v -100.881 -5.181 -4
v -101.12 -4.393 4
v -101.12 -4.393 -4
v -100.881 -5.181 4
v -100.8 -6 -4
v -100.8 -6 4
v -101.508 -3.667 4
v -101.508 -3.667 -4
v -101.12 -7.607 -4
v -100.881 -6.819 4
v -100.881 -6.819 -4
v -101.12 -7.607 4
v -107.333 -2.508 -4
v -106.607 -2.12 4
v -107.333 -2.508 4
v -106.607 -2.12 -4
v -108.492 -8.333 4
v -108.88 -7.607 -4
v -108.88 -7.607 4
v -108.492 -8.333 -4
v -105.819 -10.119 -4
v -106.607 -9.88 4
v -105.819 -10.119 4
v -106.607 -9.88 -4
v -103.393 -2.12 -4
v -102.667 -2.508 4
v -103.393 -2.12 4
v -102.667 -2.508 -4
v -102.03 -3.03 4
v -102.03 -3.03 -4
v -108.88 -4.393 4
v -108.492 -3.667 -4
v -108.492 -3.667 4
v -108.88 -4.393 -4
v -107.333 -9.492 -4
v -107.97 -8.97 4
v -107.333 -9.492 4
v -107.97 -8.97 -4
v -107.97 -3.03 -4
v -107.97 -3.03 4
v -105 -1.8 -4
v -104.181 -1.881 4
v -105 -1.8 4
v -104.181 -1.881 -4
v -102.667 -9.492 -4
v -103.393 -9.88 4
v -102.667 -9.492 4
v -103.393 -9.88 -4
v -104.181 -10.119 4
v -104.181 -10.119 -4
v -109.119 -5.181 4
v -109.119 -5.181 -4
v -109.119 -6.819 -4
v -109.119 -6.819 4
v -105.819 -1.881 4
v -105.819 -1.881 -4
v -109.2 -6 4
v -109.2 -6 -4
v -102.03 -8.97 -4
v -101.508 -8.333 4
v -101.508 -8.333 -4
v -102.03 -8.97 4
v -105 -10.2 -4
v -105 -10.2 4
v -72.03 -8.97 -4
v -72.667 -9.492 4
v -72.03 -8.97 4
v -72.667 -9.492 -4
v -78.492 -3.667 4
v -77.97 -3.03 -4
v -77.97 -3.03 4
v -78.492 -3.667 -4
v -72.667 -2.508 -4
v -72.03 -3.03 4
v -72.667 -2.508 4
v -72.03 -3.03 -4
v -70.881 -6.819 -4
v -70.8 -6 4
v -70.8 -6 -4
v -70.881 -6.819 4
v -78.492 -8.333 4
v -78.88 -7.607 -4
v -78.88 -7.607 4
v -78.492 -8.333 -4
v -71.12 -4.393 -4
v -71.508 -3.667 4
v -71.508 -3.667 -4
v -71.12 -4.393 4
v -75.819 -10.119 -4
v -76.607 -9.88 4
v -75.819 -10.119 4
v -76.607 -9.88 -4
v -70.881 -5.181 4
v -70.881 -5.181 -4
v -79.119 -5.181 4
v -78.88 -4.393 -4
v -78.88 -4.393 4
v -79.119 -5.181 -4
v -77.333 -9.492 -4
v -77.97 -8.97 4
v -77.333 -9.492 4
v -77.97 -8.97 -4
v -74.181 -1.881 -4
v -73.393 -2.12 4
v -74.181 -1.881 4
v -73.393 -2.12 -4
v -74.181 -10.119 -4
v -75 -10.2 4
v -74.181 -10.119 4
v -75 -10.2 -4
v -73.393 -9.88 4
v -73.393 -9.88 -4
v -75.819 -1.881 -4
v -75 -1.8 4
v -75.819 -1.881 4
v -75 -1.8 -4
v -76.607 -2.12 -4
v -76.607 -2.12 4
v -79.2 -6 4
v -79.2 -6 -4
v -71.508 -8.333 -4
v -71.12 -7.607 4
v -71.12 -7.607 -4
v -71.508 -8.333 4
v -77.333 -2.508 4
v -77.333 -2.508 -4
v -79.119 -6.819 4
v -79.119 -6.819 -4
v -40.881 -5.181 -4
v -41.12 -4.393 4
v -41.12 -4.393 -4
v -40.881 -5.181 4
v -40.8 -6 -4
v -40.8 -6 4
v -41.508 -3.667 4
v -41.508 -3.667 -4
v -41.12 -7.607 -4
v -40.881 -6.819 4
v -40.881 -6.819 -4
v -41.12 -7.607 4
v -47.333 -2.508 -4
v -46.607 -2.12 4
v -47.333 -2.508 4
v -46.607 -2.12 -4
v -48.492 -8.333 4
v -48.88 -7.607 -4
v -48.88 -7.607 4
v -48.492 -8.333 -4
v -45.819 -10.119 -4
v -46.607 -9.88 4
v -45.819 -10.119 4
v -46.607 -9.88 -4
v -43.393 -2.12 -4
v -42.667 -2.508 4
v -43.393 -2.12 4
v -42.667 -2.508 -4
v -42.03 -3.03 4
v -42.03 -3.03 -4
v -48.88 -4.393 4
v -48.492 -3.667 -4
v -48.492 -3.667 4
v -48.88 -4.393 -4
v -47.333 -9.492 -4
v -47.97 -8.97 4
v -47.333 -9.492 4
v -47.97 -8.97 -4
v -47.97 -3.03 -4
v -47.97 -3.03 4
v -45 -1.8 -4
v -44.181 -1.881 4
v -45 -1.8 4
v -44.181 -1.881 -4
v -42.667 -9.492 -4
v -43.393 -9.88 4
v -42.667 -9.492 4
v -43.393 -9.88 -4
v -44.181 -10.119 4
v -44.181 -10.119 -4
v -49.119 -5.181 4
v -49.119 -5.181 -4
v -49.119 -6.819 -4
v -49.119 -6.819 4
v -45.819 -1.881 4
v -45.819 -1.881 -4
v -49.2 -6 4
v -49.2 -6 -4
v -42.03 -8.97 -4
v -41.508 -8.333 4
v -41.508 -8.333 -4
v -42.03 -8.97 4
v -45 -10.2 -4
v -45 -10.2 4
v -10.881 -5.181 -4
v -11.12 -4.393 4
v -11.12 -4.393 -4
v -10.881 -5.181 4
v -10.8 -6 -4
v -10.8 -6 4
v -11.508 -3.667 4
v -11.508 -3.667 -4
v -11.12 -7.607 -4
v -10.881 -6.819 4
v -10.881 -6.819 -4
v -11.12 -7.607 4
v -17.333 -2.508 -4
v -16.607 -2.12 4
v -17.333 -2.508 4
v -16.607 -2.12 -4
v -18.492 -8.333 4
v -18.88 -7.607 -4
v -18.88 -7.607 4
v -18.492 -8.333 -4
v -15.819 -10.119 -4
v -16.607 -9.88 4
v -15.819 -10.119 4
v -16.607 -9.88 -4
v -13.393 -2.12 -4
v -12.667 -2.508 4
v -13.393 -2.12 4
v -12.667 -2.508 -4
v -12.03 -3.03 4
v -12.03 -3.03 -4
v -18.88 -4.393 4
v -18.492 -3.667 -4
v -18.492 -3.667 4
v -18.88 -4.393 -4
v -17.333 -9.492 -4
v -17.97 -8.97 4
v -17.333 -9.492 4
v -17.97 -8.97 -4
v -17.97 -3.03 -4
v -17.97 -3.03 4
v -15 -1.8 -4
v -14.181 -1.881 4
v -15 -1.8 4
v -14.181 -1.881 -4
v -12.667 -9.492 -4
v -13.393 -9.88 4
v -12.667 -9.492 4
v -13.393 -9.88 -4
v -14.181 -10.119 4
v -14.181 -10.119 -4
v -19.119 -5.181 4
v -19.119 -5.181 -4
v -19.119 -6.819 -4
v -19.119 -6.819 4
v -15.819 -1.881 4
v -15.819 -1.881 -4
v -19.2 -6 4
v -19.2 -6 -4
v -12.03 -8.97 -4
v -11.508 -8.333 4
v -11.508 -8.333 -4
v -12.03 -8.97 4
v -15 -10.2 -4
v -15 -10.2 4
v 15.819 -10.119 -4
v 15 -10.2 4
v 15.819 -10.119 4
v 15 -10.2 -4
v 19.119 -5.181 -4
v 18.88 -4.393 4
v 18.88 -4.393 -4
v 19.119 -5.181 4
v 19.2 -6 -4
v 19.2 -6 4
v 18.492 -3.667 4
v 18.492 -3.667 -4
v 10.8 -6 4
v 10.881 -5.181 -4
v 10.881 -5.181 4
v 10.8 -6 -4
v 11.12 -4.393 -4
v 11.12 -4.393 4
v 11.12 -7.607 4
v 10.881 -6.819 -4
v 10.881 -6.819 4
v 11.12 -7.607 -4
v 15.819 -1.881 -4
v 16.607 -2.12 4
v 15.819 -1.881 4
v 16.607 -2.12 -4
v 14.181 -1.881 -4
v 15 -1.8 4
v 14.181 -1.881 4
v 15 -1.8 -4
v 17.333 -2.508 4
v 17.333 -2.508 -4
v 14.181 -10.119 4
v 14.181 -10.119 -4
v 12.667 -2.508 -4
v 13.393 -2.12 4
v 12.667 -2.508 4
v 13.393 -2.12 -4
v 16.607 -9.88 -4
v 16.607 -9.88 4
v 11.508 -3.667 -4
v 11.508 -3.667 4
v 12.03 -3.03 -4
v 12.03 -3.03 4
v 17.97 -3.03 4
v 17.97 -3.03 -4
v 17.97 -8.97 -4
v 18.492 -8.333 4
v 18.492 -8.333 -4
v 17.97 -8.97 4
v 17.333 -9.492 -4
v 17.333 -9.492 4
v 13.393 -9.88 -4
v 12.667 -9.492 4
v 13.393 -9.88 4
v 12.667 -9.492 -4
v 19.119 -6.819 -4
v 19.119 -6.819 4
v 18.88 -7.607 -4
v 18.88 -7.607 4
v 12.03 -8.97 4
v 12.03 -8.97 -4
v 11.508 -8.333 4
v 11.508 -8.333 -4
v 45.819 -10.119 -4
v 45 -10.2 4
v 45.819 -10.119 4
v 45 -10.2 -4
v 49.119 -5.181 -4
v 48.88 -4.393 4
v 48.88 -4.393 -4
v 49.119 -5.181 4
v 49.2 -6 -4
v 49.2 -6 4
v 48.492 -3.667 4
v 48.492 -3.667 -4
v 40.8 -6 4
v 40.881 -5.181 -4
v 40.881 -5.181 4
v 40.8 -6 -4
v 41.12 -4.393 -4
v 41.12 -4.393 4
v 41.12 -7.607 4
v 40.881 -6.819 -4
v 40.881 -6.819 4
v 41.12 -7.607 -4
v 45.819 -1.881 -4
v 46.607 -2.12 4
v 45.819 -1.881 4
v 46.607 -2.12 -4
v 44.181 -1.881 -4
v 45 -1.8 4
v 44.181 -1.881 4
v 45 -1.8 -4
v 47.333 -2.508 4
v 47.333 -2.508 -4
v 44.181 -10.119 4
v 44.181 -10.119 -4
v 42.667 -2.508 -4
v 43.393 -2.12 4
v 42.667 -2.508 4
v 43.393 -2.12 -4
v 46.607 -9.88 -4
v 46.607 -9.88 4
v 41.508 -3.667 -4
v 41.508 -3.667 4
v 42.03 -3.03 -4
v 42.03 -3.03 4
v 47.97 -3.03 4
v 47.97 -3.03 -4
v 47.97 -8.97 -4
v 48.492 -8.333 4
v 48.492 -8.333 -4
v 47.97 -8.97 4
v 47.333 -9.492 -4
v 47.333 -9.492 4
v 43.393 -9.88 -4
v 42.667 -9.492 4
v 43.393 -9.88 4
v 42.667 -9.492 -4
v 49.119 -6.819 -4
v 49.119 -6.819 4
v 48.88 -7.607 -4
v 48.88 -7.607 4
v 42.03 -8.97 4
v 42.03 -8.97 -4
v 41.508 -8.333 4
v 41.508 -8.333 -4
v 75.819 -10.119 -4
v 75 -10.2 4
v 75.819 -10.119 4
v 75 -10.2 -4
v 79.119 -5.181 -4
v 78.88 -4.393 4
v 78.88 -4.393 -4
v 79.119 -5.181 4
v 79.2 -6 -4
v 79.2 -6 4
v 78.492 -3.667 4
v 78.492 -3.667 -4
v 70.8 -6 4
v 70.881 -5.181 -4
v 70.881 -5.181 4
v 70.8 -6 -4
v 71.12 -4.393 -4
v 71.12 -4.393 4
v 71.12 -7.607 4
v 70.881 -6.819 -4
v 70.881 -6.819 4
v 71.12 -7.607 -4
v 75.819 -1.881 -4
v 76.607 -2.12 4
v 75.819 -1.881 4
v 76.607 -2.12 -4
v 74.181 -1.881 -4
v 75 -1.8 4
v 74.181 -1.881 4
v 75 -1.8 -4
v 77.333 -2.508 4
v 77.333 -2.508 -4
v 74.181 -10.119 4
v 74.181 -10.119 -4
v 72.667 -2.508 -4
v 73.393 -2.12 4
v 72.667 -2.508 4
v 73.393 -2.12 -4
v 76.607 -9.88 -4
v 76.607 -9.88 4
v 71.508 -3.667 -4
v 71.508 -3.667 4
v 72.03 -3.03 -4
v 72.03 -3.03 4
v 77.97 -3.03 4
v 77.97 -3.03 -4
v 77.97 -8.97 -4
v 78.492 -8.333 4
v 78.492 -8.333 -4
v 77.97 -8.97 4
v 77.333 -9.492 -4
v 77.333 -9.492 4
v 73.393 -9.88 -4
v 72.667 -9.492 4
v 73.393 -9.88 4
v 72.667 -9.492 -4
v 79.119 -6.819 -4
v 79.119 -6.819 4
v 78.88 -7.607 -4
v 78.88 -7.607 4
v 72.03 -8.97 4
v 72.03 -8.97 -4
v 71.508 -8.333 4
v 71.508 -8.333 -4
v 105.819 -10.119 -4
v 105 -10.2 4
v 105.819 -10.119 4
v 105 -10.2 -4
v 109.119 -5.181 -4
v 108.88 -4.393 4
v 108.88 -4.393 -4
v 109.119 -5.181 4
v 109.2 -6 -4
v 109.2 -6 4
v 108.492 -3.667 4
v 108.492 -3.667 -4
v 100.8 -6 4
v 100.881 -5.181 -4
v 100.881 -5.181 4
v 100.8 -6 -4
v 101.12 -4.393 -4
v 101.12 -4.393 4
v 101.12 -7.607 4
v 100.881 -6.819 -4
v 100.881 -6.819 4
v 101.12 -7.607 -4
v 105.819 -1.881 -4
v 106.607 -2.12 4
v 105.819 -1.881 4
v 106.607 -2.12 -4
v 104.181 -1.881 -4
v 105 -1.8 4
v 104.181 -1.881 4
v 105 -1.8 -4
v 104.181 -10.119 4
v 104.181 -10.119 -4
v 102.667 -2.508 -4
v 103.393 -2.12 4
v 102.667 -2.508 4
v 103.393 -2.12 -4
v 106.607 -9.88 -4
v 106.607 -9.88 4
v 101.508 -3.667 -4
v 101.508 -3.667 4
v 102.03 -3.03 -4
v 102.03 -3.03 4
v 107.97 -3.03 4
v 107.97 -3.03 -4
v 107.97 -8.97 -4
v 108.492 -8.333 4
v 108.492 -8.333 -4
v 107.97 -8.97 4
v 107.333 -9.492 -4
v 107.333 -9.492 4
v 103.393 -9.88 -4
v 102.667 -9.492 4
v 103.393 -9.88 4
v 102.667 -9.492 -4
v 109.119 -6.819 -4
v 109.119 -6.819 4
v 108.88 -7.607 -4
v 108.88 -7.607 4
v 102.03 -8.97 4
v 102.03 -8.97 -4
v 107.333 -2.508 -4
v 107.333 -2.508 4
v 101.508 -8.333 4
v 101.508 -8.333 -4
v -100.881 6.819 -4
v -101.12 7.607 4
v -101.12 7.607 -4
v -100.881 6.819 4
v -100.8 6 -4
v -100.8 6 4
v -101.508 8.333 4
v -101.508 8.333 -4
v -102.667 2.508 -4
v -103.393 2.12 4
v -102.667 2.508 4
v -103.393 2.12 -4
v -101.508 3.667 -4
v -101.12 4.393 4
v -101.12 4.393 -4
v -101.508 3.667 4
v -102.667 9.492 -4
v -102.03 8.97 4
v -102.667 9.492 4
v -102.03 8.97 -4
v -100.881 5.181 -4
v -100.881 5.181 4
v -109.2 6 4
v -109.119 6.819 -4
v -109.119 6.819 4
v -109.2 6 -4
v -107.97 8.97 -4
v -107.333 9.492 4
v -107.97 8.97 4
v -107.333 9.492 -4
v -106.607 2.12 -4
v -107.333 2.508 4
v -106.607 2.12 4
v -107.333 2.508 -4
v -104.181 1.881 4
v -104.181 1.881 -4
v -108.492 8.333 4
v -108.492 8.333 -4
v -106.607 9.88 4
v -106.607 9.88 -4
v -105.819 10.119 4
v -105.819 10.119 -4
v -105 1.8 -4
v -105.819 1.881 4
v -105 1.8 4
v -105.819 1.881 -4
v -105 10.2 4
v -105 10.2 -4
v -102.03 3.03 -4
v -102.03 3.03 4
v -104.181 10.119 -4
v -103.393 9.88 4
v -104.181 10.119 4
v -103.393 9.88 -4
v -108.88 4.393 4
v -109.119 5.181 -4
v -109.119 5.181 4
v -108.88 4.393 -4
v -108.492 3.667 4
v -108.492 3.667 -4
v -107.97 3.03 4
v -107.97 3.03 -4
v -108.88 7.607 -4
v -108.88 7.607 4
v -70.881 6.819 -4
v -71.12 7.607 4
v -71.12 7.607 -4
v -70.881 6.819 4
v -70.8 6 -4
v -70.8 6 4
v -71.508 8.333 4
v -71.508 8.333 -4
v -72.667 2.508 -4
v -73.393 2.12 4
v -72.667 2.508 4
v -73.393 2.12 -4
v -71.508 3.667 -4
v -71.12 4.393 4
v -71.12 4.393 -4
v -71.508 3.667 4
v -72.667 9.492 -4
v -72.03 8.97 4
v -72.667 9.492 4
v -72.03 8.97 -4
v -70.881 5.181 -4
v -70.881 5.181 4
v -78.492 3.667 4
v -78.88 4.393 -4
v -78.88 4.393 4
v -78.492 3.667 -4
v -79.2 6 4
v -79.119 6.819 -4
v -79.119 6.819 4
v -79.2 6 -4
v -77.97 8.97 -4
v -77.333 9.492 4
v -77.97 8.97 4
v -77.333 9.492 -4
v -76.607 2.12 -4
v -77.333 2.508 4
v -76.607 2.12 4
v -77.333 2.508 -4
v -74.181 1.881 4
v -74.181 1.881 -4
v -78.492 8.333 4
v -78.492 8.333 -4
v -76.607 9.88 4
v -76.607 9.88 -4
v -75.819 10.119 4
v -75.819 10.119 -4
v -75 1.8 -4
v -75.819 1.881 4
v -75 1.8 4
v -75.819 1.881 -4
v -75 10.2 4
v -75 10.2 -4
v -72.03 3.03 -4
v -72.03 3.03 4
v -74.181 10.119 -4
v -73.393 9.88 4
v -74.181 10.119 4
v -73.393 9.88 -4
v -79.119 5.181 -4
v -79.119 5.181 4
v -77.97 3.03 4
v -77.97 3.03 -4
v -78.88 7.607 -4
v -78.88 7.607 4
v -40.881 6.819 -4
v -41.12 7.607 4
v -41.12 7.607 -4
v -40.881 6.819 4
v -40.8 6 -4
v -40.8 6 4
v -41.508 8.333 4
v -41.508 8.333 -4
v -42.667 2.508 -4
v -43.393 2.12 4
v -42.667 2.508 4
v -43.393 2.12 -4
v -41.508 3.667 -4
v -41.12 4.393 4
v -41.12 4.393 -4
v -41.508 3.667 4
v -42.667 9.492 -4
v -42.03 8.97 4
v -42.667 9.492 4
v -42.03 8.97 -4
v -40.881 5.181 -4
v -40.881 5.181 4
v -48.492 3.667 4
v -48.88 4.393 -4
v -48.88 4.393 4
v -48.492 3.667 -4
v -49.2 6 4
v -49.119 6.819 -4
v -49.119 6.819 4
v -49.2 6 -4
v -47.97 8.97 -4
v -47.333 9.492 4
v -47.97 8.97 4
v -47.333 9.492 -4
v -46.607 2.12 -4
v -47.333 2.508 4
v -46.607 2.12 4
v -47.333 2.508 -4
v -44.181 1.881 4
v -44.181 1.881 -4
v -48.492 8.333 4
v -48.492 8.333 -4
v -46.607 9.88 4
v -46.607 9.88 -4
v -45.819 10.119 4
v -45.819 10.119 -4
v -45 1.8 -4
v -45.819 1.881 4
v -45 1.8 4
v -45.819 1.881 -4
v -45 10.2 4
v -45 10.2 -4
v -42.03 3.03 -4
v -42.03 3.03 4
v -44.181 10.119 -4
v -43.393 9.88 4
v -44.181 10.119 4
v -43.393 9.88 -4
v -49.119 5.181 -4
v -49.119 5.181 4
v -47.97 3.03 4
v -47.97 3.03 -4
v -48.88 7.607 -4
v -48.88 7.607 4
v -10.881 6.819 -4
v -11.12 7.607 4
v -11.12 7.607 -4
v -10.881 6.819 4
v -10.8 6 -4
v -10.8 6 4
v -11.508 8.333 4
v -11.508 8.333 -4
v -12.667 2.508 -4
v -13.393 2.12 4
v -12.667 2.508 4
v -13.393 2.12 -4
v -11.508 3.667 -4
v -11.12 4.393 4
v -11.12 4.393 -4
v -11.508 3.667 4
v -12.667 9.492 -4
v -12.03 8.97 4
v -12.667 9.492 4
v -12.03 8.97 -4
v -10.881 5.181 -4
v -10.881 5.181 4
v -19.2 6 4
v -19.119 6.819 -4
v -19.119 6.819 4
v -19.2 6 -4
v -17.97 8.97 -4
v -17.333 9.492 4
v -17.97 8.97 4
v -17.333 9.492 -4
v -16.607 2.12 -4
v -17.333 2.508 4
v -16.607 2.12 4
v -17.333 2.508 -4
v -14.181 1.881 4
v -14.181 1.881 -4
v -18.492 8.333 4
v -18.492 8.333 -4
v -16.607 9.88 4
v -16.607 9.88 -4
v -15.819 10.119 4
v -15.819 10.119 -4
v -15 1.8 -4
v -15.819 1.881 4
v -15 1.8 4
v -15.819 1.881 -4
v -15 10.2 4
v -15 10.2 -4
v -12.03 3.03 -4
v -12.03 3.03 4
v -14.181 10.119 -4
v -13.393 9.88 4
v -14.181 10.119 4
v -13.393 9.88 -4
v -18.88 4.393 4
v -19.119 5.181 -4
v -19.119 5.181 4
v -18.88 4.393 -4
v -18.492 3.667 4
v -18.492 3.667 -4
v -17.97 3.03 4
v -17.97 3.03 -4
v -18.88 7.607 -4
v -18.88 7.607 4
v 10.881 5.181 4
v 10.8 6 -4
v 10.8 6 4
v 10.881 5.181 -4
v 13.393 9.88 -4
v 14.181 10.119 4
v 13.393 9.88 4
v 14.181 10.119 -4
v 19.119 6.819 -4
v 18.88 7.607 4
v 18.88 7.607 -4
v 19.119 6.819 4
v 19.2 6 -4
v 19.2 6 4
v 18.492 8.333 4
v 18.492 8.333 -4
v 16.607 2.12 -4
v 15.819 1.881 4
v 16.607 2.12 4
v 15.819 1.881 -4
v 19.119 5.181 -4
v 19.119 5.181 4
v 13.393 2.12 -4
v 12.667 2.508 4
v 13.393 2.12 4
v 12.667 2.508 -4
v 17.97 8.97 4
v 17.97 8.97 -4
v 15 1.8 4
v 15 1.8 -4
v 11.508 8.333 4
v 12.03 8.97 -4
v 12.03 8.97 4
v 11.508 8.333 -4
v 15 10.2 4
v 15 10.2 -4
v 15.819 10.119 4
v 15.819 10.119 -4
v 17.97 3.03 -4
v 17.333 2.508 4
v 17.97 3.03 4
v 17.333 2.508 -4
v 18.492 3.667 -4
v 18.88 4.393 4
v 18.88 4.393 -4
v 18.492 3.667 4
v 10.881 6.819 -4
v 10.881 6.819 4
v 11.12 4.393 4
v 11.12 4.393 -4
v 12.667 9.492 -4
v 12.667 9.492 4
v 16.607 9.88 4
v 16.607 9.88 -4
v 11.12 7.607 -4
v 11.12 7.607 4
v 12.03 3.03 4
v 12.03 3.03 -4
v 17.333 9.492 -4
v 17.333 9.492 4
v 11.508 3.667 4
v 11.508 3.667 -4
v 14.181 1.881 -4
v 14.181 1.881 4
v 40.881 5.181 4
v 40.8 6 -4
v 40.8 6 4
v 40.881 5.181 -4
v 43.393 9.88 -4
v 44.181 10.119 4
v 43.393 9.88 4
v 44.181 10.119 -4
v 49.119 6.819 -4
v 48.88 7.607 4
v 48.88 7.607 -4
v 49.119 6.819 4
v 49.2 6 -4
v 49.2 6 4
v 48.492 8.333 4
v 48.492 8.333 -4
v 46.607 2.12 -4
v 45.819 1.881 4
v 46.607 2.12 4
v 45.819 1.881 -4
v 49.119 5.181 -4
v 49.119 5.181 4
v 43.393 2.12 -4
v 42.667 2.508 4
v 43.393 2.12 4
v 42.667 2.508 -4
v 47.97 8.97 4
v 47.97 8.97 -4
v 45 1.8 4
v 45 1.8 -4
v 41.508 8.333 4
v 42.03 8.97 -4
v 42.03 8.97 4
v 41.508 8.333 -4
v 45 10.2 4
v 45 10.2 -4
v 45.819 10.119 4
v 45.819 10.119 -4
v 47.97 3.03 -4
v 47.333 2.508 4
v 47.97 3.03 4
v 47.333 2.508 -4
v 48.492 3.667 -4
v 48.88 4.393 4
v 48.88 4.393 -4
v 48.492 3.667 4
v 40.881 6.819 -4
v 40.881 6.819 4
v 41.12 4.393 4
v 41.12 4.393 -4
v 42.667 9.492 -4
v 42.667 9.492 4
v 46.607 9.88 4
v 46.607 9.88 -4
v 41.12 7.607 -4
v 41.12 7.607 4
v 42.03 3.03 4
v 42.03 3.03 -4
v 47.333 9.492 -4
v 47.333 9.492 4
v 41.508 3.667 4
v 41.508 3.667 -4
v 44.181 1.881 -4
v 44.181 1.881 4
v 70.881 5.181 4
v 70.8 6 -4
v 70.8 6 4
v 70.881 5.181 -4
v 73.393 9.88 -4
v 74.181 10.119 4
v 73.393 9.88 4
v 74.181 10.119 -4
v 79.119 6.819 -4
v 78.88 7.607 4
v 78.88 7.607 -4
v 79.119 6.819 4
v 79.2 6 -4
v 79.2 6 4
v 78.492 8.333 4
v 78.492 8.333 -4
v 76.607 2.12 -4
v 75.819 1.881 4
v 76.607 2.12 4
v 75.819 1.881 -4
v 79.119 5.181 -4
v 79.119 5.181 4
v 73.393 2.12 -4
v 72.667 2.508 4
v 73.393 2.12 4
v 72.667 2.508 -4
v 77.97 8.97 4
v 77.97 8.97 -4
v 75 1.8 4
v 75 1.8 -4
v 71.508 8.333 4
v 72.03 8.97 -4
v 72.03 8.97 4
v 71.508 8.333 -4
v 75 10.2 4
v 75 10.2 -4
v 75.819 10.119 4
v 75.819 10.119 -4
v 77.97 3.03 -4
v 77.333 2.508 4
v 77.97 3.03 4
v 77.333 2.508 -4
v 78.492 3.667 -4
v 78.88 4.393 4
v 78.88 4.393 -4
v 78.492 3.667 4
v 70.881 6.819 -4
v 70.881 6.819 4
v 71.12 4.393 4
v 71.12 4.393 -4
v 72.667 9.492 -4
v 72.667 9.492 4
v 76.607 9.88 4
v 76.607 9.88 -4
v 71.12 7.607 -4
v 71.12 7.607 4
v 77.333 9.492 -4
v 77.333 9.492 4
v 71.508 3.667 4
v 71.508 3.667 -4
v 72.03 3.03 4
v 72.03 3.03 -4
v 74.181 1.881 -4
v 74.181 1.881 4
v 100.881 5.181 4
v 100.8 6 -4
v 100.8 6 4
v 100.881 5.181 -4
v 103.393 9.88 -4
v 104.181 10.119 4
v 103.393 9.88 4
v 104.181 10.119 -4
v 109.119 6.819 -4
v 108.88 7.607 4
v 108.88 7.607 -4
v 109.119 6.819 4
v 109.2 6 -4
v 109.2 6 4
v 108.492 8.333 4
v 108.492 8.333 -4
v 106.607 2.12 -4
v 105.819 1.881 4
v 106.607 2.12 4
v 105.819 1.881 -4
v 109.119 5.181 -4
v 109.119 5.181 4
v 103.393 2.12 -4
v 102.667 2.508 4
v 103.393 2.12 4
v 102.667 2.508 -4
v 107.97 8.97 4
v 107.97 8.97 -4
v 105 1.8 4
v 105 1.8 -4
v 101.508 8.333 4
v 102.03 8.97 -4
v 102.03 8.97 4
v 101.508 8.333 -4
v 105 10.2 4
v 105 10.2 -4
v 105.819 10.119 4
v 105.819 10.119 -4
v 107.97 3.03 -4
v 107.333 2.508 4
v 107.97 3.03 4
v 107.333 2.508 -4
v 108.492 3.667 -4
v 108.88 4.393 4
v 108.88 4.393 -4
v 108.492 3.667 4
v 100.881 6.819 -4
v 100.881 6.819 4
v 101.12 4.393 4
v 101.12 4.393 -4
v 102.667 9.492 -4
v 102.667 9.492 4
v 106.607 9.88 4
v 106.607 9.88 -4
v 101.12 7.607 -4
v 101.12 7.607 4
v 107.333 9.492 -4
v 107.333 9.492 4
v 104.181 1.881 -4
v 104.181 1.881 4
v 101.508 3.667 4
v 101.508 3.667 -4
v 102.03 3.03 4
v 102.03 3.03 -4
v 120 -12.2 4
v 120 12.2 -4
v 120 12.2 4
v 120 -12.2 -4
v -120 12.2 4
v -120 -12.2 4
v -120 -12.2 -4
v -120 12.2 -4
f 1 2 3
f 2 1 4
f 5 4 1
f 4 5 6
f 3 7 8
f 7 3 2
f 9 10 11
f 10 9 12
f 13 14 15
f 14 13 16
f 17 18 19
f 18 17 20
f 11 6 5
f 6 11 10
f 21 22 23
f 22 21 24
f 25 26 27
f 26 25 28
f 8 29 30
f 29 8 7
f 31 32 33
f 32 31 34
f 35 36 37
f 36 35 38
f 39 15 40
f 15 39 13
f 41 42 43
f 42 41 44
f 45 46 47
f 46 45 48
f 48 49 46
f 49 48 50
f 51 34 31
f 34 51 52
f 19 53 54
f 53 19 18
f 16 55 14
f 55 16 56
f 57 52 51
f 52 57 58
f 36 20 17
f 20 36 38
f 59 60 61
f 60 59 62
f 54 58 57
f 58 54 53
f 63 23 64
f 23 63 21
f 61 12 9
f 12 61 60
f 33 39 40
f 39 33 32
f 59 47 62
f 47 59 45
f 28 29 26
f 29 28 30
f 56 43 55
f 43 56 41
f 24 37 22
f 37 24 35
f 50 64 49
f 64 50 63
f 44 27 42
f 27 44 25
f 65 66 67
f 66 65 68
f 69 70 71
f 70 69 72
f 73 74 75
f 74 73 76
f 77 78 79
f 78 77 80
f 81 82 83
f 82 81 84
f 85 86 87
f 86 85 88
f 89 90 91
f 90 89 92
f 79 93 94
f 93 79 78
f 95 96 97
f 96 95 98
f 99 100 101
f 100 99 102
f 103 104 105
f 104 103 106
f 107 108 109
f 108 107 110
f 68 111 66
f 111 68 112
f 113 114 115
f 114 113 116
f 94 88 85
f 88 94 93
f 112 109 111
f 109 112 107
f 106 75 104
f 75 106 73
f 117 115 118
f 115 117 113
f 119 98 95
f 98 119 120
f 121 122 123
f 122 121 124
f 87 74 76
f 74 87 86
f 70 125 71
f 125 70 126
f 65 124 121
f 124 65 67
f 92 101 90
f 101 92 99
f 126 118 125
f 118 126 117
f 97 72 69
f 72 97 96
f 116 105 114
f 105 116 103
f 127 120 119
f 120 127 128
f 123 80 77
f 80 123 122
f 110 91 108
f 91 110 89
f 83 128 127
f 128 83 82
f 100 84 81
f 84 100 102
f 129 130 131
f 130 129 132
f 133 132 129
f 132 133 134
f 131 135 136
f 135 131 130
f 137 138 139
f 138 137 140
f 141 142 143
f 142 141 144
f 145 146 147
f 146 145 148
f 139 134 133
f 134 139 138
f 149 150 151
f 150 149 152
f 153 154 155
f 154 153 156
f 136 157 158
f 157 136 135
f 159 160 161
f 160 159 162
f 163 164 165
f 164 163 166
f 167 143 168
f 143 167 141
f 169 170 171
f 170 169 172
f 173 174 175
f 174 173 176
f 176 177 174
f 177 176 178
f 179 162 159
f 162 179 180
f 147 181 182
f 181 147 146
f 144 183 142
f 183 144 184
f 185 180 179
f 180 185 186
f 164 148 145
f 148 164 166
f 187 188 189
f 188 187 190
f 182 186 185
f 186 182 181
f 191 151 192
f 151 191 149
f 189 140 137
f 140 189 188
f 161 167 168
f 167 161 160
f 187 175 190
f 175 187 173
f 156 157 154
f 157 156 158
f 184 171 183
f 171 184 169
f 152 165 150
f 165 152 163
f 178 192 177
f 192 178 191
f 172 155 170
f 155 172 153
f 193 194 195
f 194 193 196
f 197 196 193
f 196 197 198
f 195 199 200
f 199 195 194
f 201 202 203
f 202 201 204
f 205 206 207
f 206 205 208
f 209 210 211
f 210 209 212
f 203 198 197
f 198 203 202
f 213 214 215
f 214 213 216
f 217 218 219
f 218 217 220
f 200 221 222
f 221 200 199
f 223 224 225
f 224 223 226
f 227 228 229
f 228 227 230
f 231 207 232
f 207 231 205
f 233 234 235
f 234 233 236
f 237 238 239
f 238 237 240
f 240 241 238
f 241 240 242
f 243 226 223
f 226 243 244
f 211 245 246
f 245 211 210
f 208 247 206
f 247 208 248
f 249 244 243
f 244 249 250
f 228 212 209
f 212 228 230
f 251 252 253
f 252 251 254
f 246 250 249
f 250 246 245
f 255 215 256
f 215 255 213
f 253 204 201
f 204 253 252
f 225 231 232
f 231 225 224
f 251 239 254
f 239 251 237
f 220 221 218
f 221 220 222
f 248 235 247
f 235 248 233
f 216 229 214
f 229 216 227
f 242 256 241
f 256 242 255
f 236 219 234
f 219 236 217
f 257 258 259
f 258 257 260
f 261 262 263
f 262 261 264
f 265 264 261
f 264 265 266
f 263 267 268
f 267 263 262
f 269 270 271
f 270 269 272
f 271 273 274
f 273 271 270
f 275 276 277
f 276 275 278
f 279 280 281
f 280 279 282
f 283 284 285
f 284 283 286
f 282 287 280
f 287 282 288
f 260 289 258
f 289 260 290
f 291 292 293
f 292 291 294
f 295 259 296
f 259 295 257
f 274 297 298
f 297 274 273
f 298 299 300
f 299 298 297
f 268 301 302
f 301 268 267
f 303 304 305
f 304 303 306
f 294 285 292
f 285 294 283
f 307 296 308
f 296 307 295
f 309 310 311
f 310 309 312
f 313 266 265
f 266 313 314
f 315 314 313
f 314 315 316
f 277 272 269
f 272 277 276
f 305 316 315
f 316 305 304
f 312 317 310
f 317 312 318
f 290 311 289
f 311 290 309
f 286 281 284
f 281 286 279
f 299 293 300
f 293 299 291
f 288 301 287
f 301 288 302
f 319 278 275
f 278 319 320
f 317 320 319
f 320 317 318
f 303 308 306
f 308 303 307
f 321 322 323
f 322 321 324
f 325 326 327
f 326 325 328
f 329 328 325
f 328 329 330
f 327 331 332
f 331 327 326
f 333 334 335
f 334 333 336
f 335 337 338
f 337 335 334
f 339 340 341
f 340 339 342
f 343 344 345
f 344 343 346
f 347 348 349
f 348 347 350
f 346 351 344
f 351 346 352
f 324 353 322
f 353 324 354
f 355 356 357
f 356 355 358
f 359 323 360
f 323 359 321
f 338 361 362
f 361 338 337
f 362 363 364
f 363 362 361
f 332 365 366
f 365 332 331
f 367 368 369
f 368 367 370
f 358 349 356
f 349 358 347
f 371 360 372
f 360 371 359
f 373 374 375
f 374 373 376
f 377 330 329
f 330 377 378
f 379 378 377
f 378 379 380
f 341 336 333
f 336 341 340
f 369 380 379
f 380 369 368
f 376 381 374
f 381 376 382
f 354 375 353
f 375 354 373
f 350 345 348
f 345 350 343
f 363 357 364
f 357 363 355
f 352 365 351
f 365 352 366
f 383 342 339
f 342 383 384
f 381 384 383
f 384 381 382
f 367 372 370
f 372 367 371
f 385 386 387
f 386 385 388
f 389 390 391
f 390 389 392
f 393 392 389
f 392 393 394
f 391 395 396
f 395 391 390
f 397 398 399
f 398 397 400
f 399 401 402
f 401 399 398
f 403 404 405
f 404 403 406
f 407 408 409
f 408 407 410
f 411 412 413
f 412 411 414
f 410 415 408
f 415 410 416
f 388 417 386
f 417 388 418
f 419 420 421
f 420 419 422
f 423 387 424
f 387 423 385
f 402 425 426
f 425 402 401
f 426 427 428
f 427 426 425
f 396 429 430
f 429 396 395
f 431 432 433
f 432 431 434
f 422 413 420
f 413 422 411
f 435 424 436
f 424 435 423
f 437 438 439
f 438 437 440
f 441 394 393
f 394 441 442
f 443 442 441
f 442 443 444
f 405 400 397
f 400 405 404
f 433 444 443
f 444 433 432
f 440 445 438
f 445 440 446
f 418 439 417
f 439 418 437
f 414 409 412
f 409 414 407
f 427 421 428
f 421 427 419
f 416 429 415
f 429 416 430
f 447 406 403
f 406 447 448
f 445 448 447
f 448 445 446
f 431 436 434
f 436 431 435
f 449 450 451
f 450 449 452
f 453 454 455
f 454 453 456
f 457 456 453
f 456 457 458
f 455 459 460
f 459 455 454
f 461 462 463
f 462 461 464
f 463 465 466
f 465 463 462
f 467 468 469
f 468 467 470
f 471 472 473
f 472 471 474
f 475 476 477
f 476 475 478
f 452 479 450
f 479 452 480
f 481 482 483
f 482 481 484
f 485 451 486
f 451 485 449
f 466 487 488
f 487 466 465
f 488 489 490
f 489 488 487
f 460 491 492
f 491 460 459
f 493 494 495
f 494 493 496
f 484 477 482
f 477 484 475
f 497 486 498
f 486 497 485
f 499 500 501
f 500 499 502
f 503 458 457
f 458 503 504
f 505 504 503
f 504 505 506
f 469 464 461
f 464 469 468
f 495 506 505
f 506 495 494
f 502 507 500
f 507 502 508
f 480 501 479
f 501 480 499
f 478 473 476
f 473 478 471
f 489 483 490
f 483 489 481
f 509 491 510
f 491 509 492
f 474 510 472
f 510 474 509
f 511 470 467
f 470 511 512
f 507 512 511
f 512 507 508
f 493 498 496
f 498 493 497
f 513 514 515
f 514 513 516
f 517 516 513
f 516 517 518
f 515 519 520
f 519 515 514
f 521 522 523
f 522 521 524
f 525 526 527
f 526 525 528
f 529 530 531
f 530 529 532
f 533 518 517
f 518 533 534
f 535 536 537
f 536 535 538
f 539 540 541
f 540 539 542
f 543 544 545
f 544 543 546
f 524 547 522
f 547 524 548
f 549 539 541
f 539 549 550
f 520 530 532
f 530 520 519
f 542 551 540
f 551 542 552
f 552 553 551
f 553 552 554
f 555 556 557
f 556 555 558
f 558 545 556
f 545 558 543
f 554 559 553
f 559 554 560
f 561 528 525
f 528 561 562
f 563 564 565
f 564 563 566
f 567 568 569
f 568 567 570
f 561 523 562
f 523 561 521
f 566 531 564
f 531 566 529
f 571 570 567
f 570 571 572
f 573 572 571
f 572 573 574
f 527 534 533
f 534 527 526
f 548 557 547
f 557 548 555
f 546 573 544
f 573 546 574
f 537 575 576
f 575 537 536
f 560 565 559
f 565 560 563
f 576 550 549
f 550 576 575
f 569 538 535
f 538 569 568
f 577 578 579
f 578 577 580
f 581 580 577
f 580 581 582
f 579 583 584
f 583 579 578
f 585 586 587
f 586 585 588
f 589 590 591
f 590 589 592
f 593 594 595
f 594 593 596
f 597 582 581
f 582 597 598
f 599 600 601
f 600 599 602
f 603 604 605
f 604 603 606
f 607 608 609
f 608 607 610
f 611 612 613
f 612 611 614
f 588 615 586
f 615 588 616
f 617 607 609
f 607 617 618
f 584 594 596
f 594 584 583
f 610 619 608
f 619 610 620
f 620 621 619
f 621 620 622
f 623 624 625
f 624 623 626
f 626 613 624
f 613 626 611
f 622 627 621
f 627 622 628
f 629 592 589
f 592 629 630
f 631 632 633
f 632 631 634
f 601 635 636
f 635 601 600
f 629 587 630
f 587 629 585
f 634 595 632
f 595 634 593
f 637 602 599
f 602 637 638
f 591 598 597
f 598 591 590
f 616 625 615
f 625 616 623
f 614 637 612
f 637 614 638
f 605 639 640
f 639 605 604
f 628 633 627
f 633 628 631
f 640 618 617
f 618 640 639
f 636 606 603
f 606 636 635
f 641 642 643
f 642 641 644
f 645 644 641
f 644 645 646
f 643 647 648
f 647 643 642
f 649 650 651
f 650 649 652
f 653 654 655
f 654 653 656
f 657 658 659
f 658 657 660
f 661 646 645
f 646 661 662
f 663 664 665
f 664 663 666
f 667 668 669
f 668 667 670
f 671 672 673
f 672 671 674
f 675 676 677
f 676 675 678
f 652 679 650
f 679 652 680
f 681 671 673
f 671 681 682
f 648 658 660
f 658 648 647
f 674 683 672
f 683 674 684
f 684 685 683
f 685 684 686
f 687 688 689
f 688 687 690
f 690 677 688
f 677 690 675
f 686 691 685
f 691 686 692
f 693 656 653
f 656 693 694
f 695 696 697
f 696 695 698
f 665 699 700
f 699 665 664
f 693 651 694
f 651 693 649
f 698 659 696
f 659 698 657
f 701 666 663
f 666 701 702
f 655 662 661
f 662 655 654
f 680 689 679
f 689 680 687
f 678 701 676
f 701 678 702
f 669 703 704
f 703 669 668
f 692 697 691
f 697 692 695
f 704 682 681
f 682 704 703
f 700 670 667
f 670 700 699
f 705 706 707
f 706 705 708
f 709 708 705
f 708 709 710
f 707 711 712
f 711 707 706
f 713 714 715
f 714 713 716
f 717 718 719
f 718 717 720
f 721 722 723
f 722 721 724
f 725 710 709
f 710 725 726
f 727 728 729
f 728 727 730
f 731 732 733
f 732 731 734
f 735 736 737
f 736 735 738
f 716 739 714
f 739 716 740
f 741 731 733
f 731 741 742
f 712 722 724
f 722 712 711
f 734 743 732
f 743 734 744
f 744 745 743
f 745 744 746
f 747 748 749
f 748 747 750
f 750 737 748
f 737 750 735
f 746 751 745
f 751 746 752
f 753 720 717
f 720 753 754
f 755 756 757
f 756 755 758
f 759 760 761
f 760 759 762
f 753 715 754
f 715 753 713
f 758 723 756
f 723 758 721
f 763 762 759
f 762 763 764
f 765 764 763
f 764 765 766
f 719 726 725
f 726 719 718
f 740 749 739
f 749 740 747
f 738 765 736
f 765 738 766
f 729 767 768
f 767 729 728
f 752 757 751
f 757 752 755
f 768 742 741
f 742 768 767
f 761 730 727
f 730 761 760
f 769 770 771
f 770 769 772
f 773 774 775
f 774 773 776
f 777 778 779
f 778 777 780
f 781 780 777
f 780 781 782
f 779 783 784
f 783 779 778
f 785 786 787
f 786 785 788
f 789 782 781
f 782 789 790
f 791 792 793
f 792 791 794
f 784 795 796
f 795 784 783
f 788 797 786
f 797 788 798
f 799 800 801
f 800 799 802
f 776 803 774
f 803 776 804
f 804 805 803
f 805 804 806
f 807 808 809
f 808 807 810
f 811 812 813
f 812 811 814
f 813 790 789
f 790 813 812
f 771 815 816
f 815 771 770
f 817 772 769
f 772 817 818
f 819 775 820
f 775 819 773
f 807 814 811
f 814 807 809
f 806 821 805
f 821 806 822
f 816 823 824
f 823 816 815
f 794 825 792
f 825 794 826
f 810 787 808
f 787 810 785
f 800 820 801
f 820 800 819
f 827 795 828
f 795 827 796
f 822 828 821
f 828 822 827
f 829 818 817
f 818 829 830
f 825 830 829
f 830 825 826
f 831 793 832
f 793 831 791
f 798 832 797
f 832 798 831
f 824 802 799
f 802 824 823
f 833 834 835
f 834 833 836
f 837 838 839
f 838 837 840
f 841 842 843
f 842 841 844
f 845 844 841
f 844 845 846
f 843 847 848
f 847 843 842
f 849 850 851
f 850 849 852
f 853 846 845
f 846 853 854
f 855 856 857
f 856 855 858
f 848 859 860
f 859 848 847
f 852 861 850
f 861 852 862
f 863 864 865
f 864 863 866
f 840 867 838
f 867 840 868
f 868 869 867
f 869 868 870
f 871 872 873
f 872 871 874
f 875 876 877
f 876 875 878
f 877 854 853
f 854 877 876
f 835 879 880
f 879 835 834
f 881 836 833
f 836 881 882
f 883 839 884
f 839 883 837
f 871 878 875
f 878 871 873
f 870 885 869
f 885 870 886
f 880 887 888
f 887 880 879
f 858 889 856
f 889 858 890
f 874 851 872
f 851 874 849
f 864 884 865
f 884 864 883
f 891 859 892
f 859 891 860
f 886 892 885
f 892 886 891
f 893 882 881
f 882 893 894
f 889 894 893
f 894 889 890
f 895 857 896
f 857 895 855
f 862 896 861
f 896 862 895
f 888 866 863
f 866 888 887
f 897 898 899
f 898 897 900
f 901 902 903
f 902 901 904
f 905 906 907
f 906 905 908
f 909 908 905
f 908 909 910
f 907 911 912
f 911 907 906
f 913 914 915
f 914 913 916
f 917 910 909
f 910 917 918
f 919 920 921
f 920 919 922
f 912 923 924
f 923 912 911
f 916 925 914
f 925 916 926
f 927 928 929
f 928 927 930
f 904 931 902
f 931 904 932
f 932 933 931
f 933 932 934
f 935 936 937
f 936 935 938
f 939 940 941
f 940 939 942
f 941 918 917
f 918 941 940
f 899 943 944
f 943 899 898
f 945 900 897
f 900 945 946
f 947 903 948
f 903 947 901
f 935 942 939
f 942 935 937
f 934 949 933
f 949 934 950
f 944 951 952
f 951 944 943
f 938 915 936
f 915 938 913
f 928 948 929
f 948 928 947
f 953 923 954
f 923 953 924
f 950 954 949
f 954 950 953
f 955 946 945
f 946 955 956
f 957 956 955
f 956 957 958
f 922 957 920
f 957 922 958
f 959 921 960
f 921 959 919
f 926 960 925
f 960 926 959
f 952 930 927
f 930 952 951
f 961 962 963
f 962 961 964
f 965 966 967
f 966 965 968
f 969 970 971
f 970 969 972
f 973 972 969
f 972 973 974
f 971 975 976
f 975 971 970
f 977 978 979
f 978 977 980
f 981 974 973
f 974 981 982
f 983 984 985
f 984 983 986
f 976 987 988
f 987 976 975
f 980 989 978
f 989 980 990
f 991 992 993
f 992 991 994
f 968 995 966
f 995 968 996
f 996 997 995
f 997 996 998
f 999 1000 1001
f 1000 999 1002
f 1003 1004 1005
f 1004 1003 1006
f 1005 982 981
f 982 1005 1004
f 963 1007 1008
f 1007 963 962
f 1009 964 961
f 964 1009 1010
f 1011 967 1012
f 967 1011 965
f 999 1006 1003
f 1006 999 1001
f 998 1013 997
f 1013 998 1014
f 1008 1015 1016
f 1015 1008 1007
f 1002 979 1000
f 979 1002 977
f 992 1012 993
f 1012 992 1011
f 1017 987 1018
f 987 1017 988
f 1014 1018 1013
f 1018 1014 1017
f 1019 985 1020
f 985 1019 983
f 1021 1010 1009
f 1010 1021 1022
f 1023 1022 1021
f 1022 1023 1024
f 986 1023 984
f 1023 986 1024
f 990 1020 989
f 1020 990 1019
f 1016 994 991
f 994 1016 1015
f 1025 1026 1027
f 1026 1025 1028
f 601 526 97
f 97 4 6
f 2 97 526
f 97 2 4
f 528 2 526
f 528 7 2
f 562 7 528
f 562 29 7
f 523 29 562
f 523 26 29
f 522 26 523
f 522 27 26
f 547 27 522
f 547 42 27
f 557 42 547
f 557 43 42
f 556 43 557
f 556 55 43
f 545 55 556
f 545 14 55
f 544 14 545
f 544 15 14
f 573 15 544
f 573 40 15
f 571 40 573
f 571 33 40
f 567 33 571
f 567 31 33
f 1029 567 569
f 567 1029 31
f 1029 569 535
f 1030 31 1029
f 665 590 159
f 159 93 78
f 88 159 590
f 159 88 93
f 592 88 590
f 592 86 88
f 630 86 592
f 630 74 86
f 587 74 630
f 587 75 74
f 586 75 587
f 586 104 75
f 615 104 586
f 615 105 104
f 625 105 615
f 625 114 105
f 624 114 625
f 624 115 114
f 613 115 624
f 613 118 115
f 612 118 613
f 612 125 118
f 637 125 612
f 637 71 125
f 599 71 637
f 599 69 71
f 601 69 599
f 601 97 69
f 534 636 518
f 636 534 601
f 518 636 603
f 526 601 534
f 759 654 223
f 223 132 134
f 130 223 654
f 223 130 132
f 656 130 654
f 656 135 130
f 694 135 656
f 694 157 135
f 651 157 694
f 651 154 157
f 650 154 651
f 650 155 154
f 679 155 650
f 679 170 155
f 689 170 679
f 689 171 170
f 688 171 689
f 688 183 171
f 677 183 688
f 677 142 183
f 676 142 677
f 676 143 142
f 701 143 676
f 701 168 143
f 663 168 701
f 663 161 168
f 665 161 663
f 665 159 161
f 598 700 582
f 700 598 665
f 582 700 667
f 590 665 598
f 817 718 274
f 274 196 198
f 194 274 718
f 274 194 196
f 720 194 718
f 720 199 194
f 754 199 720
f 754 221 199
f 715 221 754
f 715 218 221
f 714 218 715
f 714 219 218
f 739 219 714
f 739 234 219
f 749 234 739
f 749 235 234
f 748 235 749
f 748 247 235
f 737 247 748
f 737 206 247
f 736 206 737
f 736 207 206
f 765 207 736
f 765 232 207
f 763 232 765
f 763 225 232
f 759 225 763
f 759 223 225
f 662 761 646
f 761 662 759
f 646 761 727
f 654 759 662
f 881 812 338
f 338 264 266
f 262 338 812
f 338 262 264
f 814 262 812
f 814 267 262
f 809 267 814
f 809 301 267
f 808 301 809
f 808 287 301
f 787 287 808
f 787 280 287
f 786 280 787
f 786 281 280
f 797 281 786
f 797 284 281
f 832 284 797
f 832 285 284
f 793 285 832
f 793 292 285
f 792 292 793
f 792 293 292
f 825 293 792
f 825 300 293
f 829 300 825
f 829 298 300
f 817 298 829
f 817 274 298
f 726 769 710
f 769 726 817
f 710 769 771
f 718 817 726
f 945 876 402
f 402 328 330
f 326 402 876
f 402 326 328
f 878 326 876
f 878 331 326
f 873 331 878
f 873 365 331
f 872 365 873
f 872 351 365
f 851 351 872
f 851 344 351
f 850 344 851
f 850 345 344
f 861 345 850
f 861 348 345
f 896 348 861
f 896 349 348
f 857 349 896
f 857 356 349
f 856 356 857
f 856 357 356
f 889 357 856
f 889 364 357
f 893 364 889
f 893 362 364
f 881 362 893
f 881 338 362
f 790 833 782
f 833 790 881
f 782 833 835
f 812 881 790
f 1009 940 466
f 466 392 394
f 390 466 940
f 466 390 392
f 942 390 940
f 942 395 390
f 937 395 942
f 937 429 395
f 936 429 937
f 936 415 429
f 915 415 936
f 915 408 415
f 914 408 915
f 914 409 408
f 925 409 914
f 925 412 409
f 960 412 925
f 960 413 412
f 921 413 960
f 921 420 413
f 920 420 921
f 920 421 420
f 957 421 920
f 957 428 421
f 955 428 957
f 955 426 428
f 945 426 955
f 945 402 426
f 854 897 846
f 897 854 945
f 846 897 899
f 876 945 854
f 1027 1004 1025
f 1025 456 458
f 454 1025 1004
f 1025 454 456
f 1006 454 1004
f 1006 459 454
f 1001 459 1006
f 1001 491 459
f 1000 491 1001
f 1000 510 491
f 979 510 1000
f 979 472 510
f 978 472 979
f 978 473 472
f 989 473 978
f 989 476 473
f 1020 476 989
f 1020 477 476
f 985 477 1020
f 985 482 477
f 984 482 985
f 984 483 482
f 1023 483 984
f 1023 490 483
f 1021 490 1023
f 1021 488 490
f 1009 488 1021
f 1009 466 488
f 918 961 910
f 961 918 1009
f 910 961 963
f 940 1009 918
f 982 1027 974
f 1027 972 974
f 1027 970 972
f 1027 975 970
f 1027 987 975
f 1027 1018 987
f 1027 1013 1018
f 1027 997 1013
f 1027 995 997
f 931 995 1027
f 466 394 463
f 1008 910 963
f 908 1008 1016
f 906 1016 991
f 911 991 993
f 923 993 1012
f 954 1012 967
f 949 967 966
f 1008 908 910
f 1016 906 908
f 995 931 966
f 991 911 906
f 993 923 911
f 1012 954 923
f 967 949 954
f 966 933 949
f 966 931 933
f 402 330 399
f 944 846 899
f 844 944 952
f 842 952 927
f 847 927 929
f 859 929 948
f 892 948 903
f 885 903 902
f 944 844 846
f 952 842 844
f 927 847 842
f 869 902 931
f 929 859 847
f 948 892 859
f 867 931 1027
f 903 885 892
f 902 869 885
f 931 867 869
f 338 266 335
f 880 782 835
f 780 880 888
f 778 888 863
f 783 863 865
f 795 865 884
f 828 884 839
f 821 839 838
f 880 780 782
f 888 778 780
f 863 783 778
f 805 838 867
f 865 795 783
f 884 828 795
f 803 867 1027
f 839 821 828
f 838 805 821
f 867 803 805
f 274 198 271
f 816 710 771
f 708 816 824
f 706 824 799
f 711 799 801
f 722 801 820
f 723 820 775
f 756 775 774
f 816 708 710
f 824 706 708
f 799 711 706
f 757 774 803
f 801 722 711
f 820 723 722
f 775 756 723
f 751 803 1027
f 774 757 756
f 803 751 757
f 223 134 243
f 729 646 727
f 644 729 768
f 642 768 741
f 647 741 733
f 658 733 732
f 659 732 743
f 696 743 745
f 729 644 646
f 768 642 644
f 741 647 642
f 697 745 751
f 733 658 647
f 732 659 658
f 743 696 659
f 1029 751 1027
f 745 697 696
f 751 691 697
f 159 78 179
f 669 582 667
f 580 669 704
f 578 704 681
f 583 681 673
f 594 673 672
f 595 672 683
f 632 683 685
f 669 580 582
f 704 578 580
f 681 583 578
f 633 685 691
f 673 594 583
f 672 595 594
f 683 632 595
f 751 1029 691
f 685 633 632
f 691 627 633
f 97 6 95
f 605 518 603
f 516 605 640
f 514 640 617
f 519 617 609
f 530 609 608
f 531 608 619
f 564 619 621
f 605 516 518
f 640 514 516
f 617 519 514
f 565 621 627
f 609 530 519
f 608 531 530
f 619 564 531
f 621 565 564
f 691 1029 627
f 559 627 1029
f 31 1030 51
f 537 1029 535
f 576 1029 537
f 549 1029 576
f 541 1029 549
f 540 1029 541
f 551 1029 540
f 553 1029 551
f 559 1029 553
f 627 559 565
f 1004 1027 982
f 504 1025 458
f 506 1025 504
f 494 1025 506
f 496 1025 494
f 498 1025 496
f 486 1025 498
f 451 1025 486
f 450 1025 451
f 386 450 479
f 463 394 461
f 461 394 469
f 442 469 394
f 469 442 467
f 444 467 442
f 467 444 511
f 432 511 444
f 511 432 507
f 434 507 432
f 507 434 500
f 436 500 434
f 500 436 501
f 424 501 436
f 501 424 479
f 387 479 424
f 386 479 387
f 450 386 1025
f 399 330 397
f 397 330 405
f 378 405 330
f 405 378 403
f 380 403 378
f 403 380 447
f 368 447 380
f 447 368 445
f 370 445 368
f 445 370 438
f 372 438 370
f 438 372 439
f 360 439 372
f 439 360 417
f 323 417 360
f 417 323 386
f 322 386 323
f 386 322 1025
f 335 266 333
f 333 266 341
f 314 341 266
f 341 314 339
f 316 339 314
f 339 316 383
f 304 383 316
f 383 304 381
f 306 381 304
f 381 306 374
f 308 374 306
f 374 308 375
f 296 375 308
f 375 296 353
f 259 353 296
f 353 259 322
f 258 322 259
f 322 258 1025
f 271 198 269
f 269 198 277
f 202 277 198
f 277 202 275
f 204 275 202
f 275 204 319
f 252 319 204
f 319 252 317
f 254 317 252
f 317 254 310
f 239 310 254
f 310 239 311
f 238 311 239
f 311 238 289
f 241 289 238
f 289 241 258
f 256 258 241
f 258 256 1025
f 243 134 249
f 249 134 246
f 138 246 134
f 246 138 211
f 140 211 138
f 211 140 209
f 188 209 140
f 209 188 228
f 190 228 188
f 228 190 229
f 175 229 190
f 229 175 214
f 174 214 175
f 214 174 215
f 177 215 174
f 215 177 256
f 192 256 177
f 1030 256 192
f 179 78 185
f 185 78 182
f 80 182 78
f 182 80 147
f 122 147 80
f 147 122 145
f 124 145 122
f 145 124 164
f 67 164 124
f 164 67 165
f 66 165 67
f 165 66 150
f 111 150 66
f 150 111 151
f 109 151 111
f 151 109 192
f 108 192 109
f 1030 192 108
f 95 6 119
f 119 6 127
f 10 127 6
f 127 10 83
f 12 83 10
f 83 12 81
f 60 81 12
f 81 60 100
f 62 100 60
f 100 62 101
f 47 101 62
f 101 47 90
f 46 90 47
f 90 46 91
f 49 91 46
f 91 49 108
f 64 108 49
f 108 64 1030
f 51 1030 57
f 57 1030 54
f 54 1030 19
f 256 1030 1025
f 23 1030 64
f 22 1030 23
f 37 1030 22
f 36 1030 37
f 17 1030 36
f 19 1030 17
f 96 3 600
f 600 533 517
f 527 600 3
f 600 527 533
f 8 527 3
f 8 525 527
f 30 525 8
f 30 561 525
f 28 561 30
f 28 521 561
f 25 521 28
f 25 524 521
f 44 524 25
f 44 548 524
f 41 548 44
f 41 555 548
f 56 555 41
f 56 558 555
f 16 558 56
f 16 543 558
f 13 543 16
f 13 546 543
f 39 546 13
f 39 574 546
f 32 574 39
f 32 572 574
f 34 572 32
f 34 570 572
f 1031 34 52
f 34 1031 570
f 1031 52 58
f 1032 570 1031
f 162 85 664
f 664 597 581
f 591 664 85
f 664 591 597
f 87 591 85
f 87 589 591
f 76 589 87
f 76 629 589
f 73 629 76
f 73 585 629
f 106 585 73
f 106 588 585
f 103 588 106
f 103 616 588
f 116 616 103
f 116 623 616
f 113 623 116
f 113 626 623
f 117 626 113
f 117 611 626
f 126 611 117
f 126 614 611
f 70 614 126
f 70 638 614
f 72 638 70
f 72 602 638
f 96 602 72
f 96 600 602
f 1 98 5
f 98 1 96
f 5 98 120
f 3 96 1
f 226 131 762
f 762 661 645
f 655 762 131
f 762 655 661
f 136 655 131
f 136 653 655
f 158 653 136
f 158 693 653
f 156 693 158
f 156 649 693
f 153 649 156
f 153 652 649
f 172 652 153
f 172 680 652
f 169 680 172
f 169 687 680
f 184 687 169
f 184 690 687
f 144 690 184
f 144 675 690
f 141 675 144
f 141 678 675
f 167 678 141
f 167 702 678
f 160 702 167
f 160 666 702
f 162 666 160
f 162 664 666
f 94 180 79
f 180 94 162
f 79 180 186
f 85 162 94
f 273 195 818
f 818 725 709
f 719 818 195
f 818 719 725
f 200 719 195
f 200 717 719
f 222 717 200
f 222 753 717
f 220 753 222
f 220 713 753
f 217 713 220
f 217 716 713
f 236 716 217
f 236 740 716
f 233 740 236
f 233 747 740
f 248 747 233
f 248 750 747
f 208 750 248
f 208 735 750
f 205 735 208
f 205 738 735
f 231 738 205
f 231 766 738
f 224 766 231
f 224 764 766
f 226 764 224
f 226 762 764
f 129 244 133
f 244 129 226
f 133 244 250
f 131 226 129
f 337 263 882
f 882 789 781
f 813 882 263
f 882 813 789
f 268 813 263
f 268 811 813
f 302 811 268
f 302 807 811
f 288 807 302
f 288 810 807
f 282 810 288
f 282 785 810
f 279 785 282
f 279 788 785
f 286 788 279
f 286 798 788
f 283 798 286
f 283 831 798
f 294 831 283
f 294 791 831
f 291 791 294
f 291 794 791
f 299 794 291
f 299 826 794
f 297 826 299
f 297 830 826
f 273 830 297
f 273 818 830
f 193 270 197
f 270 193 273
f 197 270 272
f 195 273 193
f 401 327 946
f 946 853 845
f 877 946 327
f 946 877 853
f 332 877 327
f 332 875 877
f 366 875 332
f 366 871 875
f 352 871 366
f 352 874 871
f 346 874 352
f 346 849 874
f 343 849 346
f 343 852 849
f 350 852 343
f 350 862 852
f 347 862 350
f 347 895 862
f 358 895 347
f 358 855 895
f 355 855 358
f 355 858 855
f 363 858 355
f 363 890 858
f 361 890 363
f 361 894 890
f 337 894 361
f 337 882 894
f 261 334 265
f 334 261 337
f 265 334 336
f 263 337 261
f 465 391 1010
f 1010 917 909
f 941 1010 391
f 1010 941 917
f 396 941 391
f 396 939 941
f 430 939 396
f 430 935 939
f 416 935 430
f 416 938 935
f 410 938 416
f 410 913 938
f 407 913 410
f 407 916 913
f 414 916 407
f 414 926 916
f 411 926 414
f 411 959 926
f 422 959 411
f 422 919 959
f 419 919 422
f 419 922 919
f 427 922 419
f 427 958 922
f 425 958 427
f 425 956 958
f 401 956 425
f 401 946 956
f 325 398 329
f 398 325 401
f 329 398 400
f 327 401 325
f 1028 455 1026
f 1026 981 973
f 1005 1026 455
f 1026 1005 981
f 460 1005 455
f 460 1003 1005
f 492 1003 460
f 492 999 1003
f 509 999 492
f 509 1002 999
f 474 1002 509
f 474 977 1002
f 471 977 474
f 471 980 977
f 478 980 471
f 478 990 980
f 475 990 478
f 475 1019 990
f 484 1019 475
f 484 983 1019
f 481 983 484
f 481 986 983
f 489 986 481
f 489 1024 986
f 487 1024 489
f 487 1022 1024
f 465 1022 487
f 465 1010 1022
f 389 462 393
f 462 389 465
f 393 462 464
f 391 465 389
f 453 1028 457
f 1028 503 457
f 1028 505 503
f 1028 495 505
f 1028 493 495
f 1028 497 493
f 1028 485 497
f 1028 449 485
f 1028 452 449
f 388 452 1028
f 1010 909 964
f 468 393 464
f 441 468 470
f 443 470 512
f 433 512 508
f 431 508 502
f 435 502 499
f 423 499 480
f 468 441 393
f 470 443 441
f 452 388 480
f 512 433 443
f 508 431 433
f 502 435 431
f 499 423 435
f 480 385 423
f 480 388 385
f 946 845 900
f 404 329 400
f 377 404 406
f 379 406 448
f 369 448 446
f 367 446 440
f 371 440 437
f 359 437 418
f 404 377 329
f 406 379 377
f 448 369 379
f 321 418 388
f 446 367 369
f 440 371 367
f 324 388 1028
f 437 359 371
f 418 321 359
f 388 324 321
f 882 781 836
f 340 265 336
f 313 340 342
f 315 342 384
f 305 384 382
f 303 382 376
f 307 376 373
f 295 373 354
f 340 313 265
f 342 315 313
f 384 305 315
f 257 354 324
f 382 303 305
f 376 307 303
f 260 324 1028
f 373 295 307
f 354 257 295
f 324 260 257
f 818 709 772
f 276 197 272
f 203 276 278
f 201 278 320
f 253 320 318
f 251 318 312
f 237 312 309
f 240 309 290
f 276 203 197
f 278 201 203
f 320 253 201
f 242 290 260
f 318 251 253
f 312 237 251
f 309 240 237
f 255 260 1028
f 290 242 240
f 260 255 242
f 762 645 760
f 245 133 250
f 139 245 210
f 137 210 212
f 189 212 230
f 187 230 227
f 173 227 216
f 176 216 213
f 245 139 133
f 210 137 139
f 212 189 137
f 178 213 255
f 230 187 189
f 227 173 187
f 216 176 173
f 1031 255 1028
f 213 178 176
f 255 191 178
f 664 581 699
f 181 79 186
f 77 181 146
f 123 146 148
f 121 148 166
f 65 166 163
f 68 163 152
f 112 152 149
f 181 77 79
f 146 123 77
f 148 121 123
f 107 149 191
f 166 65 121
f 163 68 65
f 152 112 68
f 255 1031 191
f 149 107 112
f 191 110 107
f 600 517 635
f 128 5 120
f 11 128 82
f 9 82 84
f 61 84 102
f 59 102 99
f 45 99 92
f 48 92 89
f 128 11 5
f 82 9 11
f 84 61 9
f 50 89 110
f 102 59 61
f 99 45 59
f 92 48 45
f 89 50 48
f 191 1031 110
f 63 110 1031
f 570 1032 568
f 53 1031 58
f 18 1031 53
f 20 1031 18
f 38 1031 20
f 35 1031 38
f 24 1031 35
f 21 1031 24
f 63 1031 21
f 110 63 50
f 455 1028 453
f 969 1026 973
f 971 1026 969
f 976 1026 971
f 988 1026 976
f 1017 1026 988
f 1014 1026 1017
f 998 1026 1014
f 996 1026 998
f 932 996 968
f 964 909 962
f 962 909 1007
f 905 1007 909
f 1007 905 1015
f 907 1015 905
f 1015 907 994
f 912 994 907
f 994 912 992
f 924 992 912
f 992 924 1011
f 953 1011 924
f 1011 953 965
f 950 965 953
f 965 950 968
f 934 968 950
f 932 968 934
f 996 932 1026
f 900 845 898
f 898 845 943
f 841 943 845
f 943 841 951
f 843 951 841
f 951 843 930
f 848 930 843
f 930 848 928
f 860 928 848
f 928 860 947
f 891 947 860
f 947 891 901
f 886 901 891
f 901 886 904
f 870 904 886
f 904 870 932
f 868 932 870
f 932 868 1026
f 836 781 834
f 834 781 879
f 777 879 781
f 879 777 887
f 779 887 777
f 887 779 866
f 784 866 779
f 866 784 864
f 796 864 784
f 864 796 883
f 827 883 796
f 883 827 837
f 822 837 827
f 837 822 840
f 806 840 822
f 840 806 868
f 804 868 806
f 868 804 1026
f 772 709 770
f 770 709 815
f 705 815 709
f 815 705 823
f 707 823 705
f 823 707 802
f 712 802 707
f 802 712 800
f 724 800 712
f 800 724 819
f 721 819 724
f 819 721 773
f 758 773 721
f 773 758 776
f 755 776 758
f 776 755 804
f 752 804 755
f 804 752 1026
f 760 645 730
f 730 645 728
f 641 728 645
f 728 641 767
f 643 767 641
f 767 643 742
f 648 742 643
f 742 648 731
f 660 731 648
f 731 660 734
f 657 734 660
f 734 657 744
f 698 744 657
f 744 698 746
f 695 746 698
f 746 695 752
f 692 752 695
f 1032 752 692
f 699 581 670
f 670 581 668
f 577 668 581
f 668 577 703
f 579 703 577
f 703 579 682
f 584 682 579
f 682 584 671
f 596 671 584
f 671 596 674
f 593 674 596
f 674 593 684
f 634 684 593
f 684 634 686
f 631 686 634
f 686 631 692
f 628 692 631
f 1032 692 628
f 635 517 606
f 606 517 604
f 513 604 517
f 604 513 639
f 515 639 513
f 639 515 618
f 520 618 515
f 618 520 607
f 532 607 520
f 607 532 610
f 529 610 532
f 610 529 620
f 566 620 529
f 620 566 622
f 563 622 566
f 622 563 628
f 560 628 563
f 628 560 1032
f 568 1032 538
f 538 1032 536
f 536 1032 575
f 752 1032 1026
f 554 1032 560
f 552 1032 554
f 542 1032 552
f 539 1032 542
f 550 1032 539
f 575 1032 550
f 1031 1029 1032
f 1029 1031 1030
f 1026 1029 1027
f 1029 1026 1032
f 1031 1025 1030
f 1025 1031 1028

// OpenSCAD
$fn = 32;

// ----------------------------------------------------------------------
// Hole bar, 8 x Ø8.4
// tworows layout, 15 mm edge offset
// ----------------------------------------------------------------------

// --- parameters (mm) ---
bar_w = 24.4;     // bar width (Y)
seat_tol = 0.1;   // tolerance at the seating features
free_tol = 0.5;   // general tolerance on the free sizes
bar_t = 8;        // bar thickness (Z)
holes = 8;        // holes per row
hole_d = 8.4;     // hole diameter
edge = 15;        // offset from the bar end to the first hole
pitch = 30;       // pitch between neighbouring holes
row_offset = 12;  // distance between the two rows

// --- derived feature positions (mm) ---
span = (holes - 1) * pitch;   // = 210   distance between the end holes
bar_l = span + 2 * edge;      // = 240   overall bar length
start_x = -bar_l / 2 + edge;  // = -105   X of the first hole
feature_centers = [
  [start_x + 0 * pitch, -row_offset / 2],
  [start_x + 1 * pitch, -row_offset / 2],
  [start_x + 2 * pitch, -row_offset / 2],
  [start_x + 3 * pitch, -row_offset / 2],
  [start_x + 4 * pitch, -row_offset / 2],
  [start_x + 5 * pitch, -row_offset / 2],
  [start_x + 6 * pitch, -row_offset / 2],
  [start_x + 7 * pitch, -row_offset / 2]
];   // hole centres of the first row
row2_centers = [
  [start_x + 0 * pitch, row_offset / 2],
  [start_x + 1 * pitch, row_offset / 2],
  [start_x + 2 * pitch, row_offset / 2],
  [start_x + 3 * pitch, row_offset / 2],
  [start_x + 4 * pitch, row_offset / 2],
  [start_x + 5 * pitch, row_offset / 2],
  [start_x + 6 * pitch, row_offset / 2],
  [start_x + 7 * pitch, row_offset / 2]
];   // hole centres of the second row

// bar with two rows of holes, both read from their own centre arrays
difference() {
  translate([-bar_l / 2, -bar_w / 2, -bar_t / 2]) cube([bar_l, bar_w, bar_t]);
  for (centre = feature_centers)
    translate([centre[0], centre[1], 0])
      cylinder(d = hole_d, h = bar_t + 2, center = true);
  for (centre = row2_centers)
    translate([centre[0], centre[1], 0])
      cylinder(d = hole_d, h = bar_t + 2, center = true);
}
